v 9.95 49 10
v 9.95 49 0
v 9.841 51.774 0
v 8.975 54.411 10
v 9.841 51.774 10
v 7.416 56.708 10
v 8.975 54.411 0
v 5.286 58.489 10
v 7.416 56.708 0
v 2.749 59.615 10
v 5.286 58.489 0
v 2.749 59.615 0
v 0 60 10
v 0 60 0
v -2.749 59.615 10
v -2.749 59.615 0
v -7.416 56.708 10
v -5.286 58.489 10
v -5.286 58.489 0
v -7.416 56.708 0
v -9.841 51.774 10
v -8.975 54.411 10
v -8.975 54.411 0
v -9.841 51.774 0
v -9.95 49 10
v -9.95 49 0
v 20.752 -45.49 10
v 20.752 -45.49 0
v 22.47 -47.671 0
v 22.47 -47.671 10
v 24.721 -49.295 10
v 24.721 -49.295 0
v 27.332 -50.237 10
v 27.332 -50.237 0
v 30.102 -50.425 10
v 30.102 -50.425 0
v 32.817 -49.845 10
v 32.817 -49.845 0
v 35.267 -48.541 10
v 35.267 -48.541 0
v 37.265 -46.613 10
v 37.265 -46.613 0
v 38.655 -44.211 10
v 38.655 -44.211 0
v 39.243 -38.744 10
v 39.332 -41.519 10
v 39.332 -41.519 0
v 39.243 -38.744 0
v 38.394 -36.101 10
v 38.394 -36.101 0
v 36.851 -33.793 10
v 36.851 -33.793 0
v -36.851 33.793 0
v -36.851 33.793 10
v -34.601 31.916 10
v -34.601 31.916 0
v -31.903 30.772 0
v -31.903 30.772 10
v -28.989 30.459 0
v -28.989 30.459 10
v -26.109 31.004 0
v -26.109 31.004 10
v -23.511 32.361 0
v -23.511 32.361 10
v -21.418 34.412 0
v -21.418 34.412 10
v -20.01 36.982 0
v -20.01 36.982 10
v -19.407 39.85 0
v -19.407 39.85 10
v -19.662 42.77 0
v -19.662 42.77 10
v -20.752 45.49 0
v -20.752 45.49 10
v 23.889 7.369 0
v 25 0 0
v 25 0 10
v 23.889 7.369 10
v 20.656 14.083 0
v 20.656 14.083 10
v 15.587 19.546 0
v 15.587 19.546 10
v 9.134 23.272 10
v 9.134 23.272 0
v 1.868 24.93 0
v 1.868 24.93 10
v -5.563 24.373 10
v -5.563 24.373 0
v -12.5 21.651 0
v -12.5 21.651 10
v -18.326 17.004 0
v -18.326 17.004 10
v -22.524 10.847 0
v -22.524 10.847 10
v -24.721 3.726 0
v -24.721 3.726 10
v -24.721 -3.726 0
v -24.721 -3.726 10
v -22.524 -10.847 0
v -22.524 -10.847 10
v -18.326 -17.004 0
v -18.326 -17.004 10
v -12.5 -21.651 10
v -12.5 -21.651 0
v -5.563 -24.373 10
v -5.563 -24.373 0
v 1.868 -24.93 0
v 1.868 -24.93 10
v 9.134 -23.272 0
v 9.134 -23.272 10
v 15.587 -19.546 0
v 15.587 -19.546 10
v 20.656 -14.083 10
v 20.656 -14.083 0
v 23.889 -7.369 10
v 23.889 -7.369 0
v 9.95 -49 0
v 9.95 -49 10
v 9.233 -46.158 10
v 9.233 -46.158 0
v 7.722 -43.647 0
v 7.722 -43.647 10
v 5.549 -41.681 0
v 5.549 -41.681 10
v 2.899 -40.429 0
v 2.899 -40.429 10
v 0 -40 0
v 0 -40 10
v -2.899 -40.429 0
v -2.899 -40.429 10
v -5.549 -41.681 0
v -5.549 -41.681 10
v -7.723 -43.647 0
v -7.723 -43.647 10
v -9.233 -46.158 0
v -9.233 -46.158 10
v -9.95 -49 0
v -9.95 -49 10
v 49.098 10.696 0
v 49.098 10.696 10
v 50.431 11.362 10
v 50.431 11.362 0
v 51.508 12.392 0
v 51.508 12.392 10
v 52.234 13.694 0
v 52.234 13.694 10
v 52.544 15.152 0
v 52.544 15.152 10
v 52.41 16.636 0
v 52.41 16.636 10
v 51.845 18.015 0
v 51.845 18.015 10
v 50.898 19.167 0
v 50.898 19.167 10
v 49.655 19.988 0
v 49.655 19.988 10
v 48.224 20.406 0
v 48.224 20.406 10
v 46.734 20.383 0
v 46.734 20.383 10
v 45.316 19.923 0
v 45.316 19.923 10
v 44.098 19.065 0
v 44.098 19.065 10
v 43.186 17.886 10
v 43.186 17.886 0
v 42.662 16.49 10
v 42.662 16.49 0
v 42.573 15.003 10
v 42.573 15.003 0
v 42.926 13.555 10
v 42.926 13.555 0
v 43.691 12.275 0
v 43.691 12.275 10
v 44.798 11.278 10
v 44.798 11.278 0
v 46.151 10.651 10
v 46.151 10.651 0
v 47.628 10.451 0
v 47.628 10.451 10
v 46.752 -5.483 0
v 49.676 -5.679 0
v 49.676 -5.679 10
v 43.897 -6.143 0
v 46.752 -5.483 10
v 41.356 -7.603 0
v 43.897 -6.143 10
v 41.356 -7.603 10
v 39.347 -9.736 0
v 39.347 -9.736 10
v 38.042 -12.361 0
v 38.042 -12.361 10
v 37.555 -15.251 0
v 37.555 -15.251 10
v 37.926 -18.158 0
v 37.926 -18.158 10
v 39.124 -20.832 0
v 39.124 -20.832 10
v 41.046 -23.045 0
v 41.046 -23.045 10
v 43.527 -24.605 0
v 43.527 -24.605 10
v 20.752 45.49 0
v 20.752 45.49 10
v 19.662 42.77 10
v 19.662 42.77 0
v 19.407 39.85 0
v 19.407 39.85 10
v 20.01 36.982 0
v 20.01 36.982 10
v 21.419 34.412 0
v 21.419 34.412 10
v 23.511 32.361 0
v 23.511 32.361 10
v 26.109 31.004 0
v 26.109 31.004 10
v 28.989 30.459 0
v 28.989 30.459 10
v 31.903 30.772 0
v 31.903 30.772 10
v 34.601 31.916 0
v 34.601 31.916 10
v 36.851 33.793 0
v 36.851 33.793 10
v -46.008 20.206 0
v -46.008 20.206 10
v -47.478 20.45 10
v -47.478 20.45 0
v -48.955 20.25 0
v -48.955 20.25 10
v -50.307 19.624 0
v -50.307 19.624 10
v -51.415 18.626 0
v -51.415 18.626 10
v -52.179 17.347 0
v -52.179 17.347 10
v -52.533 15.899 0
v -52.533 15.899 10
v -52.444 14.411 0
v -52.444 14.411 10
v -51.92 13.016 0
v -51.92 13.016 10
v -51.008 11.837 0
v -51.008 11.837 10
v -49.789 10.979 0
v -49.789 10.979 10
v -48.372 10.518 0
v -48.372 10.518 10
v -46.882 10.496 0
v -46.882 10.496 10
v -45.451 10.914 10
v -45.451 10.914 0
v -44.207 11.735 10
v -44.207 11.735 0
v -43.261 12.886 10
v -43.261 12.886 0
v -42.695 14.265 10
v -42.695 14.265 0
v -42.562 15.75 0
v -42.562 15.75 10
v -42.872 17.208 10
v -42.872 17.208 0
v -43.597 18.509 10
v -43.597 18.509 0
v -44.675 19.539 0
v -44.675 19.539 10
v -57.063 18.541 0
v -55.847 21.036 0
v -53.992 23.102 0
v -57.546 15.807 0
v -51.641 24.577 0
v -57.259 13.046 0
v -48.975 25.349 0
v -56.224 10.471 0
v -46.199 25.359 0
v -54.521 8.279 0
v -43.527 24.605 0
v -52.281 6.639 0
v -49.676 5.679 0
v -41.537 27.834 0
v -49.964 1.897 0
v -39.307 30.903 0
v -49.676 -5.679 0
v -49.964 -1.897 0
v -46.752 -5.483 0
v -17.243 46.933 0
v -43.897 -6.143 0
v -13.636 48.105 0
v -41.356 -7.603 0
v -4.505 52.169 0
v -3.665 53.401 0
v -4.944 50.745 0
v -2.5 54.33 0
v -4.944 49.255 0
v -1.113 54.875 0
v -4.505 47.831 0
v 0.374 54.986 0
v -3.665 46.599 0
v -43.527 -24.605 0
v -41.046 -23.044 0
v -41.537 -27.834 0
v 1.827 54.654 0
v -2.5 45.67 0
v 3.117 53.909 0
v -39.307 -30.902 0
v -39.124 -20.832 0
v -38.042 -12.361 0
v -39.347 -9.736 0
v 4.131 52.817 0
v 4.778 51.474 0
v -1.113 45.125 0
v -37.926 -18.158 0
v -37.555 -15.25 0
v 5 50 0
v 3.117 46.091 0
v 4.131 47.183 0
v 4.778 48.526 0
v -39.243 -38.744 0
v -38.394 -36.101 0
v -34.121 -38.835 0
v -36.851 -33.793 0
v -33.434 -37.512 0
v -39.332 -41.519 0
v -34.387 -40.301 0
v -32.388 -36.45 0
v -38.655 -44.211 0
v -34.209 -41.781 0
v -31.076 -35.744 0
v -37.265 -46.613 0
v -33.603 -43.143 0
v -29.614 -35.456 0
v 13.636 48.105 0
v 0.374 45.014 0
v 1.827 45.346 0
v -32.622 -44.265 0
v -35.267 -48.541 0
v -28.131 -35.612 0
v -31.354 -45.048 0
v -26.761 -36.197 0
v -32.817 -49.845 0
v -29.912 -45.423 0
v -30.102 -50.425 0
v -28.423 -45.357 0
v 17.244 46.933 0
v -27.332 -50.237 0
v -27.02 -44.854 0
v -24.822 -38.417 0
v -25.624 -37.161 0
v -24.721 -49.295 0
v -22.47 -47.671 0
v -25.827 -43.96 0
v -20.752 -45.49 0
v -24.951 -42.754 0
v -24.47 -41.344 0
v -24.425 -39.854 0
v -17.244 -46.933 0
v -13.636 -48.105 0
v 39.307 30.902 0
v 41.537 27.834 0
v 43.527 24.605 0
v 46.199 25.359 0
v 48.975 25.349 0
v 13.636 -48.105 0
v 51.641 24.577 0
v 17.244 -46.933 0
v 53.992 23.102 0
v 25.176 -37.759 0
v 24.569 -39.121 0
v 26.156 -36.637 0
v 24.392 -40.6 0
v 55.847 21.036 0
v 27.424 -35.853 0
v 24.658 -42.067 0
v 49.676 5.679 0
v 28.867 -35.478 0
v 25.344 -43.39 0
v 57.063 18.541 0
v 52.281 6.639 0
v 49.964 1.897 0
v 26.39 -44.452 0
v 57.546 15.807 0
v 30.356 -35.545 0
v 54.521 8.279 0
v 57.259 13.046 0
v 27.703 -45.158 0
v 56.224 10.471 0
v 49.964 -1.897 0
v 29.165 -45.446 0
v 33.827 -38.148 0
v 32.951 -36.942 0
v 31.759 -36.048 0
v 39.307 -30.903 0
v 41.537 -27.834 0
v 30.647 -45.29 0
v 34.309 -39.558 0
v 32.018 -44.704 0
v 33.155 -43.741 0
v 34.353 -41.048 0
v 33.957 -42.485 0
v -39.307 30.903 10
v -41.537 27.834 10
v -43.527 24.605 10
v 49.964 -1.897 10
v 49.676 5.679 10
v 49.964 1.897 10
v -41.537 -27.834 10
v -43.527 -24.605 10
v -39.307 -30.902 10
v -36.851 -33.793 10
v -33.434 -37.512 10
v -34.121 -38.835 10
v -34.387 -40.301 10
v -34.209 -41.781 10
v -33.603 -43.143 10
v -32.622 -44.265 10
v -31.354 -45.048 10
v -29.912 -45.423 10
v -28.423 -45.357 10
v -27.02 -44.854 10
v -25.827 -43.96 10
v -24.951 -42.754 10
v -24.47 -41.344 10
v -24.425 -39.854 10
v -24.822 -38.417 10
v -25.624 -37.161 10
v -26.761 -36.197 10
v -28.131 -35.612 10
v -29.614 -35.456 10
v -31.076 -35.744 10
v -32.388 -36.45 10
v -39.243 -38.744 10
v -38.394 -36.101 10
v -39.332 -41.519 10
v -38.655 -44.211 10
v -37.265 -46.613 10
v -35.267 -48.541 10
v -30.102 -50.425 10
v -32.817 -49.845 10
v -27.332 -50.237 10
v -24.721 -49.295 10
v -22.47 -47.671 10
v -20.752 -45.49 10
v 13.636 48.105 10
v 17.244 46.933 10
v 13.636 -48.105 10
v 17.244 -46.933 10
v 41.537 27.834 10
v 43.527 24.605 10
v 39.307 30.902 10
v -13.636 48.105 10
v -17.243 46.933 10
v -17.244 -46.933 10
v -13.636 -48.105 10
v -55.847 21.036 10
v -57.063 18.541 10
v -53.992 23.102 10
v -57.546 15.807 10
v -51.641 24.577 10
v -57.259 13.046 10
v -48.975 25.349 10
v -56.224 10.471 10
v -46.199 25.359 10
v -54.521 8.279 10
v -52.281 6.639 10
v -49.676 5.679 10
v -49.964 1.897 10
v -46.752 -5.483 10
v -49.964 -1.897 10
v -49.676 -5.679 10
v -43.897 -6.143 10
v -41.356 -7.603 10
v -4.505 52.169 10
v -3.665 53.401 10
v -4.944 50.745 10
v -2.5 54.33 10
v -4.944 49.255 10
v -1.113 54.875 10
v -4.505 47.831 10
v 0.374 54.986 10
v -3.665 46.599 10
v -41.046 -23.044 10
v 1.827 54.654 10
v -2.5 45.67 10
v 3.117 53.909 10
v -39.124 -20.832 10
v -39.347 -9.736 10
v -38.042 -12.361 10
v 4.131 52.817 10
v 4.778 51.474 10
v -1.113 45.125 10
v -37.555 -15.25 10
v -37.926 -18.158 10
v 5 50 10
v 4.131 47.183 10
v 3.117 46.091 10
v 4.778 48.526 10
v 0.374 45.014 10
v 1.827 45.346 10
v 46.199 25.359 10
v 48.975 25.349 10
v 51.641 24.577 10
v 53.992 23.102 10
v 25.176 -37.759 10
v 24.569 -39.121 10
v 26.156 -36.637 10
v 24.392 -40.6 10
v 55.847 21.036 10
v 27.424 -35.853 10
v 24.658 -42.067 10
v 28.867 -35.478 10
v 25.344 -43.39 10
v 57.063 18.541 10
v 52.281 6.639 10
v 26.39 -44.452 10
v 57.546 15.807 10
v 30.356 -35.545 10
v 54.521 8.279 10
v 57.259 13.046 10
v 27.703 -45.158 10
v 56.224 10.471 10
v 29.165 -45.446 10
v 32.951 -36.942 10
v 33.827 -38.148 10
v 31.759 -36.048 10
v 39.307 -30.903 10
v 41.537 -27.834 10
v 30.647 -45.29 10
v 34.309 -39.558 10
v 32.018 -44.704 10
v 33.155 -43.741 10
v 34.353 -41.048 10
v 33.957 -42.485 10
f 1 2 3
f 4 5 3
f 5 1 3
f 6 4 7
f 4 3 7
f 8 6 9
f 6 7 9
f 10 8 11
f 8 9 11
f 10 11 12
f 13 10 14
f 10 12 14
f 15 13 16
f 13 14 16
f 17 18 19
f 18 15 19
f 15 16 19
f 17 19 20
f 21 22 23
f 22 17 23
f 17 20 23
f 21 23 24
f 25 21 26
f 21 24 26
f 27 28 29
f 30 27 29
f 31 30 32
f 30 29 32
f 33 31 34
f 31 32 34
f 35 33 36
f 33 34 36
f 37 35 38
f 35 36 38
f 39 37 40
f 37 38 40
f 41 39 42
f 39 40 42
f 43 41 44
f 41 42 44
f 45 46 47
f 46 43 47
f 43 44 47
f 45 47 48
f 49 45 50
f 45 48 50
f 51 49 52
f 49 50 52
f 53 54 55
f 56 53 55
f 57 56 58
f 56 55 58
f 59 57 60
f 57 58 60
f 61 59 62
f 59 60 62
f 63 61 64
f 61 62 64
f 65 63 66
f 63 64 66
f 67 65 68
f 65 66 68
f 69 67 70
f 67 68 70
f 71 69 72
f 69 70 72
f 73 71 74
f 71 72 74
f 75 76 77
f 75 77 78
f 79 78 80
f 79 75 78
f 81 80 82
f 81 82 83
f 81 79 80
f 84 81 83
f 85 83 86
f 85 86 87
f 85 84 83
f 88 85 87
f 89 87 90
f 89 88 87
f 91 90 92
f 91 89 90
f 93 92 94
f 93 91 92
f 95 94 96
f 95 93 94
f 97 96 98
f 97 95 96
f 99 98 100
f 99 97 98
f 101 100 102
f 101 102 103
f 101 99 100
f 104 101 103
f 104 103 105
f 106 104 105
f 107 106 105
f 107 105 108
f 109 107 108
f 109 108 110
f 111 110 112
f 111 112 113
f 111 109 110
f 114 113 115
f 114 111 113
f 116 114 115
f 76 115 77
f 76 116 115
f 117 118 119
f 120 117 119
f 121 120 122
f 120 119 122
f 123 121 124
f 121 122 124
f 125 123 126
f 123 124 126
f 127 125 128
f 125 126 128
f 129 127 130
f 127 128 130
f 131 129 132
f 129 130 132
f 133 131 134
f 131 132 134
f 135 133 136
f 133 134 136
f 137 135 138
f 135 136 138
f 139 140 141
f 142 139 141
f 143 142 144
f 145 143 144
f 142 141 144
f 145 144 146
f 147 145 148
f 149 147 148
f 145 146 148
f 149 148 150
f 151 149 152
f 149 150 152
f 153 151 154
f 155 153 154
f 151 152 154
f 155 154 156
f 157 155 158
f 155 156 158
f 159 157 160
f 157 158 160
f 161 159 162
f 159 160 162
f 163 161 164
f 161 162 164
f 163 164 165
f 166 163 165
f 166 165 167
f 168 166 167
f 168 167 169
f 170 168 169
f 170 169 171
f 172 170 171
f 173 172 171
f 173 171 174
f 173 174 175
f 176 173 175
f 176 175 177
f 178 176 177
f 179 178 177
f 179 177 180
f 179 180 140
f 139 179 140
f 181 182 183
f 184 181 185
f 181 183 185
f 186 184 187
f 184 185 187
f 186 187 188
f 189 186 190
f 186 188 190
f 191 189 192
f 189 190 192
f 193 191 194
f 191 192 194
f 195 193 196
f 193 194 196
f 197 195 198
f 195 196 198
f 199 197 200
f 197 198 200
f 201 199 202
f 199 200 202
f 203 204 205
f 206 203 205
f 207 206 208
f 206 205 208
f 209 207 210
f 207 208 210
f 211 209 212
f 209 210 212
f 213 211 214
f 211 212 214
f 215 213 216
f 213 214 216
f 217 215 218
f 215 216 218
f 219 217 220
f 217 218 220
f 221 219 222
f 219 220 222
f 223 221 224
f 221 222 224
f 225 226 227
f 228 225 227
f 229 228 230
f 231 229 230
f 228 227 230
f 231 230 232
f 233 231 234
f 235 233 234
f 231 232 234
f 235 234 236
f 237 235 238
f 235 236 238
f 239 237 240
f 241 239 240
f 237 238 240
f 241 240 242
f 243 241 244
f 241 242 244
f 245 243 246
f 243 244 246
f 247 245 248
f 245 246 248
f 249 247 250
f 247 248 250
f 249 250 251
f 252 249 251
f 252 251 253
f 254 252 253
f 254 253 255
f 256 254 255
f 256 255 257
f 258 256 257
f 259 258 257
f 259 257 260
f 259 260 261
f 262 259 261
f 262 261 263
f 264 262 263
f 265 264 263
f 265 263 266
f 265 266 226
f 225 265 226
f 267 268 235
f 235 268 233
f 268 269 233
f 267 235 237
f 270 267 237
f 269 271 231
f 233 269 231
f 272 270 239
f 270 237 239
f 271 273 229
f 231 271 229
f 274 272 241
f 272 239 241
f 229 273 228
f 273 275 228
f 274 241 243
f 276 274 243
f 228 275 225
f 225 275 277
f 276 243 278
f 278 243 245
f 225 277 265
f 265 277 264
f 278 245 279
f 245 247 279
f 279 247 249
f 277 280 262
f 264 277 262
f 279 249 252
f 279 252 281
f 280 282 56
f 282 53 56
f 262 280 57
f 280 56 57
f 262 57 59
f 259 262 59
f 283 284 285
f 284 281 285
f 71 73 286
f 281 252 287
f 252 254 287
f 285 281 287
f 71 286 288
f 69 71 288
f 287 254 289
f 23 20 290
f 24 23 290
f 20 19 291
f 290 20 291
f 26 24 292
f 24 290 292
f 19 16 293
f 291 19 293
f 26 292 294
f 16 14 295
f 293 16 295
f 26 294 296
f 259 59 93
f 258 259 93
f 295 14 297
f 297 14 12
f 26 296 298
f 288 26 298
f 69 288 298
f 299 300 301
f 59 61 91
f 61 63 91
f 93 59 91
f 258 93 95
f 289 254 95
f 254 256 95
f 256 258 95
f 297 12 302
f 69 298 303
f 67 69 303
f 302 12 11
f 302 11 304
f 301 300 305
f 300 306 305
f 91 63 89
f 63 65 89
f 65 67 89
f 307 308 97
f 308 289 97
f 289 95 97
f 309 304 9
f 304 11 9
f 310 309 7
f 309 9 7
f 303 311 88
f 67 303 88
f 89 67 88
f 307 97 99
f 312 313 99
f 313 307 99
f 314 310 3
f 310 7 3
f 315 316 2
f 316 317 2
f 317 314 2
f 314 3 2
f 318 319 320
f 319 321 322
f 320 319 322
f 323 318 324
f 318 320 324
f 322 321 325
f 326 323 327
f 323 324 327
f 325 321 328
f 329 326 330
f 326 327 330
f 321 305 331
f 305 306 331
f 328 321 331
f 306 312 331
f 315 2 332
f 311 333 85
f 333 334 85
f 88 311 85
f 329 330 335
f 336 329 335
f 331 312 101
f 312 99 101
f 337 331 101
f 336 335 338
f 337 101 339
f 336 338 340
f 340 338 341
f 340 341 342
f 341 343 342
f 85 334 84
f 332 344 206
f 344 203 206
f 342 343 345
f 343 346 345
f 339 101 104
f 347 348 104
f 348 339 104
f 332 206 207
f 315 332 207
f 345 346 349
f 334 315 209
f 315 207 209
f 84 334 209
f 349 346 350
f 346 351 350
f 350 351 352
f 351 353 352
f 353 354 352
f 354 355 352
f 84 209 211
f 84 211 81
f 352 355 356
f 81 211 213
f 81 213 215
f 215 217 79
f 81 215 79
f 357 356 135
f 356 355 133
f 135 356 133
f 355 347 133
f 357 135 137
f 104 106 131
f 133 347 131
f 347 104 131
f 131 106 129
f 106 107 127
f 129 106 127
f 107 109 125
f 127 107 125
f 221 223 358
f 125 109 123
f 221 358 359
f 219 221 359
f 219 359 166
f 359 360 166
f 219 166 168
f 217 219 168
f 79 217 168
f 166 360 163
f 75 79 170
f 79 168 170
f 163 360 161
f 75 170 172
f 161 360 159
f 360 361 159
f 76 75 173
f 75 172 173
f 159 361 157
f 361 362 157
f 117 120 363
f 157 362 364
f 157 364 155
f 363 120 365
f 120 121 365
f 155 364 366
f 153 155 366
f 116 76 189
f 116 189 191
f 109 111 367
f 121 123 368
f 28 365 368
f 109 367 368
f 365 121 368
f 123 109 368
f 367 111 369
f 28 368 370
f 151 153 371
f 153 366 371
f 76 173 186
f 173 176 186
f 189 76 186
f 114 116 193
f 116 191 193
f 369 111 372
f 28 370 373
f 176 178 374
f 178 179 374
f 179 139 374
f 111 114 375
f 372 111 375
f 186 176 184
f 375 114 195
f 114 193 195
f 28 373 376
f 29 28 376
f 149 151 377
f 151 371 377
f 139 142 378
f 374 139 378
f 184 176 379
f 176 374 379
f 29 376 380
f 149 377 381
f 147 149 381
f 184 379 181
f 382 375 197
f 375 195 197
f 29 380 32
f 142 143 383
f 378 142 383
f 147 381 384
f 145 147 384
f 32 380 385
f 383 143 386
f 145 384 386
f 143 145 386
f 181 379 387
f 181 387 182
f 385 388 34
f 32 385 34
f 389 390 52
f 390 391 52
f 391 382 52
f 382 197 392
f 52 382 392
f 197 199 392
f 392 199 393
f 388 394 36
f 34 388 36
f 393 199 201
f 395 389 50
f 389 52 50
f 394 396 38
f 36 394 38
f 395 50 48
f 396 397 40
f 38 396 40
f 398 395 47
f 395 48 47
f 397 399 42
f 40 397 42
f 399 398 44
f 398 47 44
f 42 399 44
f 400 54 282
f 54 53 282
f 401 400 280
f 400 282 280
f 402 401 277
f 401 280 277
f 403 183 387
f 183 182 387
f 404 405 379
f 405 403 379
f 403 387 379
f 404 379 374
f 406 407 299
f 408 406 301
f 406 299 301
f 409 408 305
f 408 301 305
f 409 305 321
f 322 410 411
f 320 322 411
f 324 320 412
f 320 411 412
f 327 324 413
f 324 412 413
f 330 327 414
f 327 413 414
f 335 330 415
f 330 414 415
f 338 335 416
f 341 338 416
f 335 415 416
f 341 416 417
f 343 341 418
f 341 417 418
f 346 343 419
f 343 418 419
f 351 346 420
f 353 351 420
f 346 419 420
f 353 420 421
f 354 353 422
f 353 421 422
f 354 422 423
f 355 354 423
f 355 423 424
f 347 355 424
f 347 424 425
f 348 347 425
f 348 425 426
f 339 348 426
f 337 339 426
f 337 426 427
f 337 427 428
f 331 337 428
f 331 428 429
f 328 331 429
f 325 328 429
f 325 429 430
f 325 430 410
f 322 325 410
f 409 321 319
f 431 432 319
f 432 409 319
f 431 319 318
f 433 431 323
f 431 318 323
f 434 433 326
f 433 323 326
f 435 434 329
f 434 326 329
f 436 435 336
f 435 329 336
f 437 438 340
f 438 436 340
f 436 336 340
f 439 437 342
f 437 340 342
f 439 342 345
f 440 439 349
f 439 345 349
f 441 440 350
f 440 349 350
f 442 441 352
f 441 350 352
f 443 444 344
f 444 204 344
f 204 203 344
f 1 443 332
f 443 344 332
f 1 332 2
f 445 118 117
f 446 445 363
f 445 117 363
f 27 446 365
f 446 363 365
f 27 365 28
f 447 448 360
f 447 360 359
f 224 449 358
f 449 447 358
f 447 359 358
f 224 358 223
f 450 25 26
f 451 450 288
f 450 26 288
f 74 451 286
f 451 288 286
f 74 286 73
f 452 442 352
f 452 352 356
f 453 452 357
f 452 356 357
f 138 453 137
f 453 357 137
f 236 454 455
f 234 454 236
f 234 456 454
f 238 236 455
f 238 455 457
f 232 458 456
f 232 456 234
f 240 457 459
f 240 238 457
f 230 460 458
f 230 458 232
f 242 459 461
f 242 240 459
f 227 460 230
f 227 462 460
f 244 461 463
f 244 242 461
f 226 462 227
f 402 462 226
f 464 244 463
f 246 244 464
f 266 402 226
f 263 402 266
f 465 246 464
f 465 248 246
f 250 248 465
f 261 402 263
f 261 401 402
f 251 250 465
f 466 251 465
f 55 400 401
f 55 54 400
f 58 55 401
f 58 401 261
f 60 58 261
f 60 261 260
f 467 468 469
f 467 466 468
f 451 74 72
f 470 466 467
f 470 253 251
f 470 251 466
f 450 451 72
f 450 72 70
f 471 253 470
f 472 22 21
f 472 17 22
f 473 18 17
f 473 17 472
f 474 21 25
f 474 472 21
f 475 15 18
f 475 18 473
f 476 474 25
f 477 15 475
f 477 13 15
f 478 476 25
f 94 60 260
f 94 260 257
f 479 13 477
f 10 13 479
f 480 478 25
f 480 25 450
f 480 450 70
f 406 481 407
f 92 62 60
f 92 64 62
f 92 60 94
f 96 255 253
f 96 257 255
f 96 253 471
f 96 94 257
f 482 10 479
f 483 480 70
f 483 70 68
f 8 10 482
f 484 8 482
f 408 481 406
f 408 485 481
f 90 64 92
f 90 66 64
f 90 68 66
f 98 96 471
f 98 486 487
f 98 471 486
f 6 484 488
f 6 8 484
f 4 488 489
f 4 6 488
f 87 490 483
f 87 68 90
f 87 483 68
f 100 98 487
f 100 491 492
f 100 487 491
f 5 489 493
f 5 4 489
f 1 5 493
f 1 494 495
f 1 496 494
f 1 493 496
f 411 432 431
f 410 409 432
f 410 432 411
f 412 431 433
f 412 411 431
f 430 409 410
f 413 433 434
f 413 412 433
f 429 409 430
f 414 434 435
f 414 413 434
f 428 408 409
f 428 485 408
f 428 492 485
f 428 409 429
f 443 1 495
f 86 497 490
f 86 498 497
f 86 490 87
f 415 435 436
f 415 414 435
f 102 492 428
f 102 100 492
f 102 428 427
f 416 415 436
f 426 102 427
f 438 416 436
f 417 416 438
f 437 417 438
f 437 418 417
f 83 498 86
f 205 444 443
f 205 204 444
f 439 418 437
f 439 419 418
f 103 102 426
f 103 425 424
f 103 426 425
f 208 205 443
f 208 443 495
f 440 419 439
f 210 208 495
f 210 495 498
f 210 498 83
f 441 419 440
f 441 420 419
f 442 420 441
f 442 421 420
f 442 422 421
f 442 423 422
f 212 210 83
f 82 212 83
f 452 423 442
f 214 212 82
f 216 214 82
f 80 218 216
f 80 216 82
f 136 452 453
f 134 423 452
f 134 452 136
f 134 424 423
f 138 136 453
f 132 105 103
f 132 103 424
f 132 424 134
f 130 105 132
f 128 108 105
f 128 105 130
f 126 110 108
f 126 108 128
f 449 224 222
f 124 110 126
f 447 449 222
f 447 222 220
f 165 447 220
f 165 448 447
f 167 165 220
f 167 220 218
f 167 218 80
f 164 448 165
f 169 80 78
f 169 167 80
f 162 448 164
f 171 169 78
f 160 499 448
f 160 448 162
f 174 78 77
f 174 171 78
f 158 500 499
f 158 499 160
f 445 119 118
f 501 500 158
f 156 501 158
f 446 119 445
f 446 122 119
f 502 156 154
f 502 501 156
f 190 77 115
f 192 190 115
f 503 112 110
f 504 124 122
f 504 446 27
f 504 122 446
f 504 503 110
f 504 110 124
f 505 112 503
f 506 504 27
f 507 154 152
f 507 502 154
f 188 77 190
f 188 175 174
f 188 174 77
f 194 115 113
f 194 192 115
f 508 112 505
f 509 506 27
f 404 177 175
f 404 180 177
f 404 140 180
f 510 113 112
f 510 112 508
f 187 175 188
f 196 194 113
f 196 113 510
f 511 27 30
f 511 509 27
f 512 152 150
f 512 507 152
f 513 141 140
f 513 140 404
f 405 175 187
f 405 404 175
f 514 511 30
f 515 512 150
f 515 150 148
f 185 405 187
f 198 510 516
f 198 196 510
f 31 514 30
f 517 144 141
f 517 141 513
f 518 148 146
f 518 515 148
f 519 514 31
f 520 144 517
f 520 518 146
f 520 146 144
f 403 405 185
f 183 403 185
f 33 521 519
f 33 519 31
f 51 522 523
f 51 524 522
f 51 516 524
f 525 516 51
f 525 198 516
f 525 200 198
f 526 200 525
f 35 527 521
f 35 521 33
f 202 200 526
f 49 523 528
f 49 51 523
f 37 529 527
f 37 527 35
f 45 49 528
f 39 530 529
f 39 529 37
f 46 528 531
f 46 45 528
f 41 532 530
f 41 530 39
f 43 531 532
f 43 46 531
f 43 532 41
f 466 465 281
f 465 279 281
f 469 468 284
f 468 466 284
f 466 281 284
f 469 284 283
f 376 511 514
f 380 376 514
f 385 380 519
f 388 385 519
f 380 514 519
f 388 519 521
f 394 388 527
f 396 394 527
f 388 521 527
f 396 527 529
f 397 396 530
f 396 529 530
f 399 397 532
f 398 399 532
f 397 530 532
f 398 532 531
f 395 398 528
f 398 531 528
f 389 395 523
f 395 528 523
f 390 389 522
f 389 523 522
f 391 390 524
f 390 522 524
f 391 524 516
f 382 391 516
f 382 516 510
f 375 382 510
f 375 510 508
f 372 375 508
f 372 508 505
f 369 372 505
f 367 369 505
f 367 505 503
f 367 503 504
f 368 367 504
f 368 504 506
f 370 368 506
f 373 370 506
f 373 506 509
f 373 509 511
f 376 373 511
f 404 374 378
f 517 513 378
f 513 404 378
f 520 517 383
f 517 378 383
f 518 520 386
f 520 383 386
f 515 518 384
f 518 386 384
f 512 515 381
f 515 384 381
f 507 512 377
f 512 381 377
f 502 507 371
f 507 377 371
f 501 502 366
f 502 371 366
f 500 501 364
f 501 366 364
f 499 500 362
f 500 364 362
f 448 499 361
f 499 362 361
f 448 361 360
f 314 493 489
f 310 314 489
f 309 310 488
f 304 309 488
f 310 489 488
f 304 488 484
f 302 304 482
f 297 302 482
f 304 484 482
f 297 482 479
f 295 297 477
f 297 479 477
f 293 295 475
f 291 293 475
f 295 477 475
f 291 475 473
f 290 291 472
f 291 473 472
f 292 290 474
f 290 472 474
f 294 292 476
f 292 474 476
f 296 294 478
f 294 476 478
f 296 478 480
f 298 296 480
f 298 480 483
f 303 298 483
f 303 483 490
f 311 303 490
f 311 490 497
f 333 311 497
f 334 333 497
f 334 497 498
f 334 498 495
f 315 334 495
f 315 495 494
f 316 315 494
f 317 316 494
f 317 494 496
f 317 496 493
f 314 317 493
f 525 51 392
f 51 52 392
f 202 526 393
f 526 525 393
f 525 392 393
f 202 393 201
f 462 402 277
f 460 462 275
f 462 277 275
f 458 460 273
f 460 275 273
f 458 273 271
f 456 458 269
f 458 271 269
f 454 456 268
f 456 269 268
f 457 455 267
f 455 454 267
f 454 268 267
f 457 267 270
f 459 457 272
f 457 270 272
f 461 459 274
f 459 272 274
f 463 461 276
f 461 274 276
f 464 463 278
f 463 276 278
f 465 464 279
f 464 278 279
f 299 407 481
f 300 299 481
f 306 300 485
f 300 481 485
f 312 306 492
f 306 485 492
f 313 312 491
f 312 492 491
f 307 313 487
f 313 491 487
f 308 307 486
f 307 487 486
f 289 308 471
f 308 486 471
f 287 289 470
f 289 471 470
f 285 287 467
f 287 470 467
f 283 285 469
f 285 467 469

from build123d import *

# Parameters (mm, degrees)
SKETCH_R              = 50
SKETCH_R_2            = 25
PAD_DEPTH             = 10
SKETCH001_R           = 10
PAD001_DEPTH          = 10
POLARPATTERN_COUNT    = 5
SKETCH002_R           = 5
SKETCH002_R_2         = 10
POCKET_DEPTH          = 329.680222
POLARPATTERN001_COUNT = 5


with BuildPart() as part:
    # Sketch → Pad (new body)
    with BuildSketch(Plane.XY):
        Circle(SKETCH_R)
        Circle(SKETCH_R_2, mode=Mode.SUBTRACT)
    extrude(amount=PAD_DEPTH)

    # Sketch001 → Pad001 (join)
    with BuildSketch(Plane.XY):
        with Locations((0, 50)):
            Circle(SKETCH001_R)
    pad001 = extrude(amount=PAD001_DEPTH)

    # PolarPattern: Pad001 ×5 about axis
    polarpattern_axis = Axis((0, 0, 0), (0, 0, 1))
    for i in range(1, POLARPATTERN_COUNT):
        add(pad001.rotate(polarpattern_axis, i * 360 / POLARPATTERN_COUNT))

    # Sketch002 (on Face9 of PolarPattern) → Pocket (cut, through all)
    with BuildSketch(Plane.XY.offset(10)):
        with Locations((-1e-06, 50)):
            Circle(SKETCH002_R)
        with Locations((-6e-05, -50)):
            Circle(SKETCH002_R_2)
    pocket = extrude(amount=-POCKET_DEPTH, mode=Mode.SUBTRACT)

    # PolarPattern001: Pocket ×5 about axis
    polarpattern001_axis = Axis((0, 0, 10), (0, 0, 1))
    for i in range(1, POLARPATTERN001_COUNT):
        add(pocket.rotate(polarpattern001_axis, i * 360 / POLARPATTERN001_COUNT), mode=Mode.SUBTRACT)


solid = part.part
